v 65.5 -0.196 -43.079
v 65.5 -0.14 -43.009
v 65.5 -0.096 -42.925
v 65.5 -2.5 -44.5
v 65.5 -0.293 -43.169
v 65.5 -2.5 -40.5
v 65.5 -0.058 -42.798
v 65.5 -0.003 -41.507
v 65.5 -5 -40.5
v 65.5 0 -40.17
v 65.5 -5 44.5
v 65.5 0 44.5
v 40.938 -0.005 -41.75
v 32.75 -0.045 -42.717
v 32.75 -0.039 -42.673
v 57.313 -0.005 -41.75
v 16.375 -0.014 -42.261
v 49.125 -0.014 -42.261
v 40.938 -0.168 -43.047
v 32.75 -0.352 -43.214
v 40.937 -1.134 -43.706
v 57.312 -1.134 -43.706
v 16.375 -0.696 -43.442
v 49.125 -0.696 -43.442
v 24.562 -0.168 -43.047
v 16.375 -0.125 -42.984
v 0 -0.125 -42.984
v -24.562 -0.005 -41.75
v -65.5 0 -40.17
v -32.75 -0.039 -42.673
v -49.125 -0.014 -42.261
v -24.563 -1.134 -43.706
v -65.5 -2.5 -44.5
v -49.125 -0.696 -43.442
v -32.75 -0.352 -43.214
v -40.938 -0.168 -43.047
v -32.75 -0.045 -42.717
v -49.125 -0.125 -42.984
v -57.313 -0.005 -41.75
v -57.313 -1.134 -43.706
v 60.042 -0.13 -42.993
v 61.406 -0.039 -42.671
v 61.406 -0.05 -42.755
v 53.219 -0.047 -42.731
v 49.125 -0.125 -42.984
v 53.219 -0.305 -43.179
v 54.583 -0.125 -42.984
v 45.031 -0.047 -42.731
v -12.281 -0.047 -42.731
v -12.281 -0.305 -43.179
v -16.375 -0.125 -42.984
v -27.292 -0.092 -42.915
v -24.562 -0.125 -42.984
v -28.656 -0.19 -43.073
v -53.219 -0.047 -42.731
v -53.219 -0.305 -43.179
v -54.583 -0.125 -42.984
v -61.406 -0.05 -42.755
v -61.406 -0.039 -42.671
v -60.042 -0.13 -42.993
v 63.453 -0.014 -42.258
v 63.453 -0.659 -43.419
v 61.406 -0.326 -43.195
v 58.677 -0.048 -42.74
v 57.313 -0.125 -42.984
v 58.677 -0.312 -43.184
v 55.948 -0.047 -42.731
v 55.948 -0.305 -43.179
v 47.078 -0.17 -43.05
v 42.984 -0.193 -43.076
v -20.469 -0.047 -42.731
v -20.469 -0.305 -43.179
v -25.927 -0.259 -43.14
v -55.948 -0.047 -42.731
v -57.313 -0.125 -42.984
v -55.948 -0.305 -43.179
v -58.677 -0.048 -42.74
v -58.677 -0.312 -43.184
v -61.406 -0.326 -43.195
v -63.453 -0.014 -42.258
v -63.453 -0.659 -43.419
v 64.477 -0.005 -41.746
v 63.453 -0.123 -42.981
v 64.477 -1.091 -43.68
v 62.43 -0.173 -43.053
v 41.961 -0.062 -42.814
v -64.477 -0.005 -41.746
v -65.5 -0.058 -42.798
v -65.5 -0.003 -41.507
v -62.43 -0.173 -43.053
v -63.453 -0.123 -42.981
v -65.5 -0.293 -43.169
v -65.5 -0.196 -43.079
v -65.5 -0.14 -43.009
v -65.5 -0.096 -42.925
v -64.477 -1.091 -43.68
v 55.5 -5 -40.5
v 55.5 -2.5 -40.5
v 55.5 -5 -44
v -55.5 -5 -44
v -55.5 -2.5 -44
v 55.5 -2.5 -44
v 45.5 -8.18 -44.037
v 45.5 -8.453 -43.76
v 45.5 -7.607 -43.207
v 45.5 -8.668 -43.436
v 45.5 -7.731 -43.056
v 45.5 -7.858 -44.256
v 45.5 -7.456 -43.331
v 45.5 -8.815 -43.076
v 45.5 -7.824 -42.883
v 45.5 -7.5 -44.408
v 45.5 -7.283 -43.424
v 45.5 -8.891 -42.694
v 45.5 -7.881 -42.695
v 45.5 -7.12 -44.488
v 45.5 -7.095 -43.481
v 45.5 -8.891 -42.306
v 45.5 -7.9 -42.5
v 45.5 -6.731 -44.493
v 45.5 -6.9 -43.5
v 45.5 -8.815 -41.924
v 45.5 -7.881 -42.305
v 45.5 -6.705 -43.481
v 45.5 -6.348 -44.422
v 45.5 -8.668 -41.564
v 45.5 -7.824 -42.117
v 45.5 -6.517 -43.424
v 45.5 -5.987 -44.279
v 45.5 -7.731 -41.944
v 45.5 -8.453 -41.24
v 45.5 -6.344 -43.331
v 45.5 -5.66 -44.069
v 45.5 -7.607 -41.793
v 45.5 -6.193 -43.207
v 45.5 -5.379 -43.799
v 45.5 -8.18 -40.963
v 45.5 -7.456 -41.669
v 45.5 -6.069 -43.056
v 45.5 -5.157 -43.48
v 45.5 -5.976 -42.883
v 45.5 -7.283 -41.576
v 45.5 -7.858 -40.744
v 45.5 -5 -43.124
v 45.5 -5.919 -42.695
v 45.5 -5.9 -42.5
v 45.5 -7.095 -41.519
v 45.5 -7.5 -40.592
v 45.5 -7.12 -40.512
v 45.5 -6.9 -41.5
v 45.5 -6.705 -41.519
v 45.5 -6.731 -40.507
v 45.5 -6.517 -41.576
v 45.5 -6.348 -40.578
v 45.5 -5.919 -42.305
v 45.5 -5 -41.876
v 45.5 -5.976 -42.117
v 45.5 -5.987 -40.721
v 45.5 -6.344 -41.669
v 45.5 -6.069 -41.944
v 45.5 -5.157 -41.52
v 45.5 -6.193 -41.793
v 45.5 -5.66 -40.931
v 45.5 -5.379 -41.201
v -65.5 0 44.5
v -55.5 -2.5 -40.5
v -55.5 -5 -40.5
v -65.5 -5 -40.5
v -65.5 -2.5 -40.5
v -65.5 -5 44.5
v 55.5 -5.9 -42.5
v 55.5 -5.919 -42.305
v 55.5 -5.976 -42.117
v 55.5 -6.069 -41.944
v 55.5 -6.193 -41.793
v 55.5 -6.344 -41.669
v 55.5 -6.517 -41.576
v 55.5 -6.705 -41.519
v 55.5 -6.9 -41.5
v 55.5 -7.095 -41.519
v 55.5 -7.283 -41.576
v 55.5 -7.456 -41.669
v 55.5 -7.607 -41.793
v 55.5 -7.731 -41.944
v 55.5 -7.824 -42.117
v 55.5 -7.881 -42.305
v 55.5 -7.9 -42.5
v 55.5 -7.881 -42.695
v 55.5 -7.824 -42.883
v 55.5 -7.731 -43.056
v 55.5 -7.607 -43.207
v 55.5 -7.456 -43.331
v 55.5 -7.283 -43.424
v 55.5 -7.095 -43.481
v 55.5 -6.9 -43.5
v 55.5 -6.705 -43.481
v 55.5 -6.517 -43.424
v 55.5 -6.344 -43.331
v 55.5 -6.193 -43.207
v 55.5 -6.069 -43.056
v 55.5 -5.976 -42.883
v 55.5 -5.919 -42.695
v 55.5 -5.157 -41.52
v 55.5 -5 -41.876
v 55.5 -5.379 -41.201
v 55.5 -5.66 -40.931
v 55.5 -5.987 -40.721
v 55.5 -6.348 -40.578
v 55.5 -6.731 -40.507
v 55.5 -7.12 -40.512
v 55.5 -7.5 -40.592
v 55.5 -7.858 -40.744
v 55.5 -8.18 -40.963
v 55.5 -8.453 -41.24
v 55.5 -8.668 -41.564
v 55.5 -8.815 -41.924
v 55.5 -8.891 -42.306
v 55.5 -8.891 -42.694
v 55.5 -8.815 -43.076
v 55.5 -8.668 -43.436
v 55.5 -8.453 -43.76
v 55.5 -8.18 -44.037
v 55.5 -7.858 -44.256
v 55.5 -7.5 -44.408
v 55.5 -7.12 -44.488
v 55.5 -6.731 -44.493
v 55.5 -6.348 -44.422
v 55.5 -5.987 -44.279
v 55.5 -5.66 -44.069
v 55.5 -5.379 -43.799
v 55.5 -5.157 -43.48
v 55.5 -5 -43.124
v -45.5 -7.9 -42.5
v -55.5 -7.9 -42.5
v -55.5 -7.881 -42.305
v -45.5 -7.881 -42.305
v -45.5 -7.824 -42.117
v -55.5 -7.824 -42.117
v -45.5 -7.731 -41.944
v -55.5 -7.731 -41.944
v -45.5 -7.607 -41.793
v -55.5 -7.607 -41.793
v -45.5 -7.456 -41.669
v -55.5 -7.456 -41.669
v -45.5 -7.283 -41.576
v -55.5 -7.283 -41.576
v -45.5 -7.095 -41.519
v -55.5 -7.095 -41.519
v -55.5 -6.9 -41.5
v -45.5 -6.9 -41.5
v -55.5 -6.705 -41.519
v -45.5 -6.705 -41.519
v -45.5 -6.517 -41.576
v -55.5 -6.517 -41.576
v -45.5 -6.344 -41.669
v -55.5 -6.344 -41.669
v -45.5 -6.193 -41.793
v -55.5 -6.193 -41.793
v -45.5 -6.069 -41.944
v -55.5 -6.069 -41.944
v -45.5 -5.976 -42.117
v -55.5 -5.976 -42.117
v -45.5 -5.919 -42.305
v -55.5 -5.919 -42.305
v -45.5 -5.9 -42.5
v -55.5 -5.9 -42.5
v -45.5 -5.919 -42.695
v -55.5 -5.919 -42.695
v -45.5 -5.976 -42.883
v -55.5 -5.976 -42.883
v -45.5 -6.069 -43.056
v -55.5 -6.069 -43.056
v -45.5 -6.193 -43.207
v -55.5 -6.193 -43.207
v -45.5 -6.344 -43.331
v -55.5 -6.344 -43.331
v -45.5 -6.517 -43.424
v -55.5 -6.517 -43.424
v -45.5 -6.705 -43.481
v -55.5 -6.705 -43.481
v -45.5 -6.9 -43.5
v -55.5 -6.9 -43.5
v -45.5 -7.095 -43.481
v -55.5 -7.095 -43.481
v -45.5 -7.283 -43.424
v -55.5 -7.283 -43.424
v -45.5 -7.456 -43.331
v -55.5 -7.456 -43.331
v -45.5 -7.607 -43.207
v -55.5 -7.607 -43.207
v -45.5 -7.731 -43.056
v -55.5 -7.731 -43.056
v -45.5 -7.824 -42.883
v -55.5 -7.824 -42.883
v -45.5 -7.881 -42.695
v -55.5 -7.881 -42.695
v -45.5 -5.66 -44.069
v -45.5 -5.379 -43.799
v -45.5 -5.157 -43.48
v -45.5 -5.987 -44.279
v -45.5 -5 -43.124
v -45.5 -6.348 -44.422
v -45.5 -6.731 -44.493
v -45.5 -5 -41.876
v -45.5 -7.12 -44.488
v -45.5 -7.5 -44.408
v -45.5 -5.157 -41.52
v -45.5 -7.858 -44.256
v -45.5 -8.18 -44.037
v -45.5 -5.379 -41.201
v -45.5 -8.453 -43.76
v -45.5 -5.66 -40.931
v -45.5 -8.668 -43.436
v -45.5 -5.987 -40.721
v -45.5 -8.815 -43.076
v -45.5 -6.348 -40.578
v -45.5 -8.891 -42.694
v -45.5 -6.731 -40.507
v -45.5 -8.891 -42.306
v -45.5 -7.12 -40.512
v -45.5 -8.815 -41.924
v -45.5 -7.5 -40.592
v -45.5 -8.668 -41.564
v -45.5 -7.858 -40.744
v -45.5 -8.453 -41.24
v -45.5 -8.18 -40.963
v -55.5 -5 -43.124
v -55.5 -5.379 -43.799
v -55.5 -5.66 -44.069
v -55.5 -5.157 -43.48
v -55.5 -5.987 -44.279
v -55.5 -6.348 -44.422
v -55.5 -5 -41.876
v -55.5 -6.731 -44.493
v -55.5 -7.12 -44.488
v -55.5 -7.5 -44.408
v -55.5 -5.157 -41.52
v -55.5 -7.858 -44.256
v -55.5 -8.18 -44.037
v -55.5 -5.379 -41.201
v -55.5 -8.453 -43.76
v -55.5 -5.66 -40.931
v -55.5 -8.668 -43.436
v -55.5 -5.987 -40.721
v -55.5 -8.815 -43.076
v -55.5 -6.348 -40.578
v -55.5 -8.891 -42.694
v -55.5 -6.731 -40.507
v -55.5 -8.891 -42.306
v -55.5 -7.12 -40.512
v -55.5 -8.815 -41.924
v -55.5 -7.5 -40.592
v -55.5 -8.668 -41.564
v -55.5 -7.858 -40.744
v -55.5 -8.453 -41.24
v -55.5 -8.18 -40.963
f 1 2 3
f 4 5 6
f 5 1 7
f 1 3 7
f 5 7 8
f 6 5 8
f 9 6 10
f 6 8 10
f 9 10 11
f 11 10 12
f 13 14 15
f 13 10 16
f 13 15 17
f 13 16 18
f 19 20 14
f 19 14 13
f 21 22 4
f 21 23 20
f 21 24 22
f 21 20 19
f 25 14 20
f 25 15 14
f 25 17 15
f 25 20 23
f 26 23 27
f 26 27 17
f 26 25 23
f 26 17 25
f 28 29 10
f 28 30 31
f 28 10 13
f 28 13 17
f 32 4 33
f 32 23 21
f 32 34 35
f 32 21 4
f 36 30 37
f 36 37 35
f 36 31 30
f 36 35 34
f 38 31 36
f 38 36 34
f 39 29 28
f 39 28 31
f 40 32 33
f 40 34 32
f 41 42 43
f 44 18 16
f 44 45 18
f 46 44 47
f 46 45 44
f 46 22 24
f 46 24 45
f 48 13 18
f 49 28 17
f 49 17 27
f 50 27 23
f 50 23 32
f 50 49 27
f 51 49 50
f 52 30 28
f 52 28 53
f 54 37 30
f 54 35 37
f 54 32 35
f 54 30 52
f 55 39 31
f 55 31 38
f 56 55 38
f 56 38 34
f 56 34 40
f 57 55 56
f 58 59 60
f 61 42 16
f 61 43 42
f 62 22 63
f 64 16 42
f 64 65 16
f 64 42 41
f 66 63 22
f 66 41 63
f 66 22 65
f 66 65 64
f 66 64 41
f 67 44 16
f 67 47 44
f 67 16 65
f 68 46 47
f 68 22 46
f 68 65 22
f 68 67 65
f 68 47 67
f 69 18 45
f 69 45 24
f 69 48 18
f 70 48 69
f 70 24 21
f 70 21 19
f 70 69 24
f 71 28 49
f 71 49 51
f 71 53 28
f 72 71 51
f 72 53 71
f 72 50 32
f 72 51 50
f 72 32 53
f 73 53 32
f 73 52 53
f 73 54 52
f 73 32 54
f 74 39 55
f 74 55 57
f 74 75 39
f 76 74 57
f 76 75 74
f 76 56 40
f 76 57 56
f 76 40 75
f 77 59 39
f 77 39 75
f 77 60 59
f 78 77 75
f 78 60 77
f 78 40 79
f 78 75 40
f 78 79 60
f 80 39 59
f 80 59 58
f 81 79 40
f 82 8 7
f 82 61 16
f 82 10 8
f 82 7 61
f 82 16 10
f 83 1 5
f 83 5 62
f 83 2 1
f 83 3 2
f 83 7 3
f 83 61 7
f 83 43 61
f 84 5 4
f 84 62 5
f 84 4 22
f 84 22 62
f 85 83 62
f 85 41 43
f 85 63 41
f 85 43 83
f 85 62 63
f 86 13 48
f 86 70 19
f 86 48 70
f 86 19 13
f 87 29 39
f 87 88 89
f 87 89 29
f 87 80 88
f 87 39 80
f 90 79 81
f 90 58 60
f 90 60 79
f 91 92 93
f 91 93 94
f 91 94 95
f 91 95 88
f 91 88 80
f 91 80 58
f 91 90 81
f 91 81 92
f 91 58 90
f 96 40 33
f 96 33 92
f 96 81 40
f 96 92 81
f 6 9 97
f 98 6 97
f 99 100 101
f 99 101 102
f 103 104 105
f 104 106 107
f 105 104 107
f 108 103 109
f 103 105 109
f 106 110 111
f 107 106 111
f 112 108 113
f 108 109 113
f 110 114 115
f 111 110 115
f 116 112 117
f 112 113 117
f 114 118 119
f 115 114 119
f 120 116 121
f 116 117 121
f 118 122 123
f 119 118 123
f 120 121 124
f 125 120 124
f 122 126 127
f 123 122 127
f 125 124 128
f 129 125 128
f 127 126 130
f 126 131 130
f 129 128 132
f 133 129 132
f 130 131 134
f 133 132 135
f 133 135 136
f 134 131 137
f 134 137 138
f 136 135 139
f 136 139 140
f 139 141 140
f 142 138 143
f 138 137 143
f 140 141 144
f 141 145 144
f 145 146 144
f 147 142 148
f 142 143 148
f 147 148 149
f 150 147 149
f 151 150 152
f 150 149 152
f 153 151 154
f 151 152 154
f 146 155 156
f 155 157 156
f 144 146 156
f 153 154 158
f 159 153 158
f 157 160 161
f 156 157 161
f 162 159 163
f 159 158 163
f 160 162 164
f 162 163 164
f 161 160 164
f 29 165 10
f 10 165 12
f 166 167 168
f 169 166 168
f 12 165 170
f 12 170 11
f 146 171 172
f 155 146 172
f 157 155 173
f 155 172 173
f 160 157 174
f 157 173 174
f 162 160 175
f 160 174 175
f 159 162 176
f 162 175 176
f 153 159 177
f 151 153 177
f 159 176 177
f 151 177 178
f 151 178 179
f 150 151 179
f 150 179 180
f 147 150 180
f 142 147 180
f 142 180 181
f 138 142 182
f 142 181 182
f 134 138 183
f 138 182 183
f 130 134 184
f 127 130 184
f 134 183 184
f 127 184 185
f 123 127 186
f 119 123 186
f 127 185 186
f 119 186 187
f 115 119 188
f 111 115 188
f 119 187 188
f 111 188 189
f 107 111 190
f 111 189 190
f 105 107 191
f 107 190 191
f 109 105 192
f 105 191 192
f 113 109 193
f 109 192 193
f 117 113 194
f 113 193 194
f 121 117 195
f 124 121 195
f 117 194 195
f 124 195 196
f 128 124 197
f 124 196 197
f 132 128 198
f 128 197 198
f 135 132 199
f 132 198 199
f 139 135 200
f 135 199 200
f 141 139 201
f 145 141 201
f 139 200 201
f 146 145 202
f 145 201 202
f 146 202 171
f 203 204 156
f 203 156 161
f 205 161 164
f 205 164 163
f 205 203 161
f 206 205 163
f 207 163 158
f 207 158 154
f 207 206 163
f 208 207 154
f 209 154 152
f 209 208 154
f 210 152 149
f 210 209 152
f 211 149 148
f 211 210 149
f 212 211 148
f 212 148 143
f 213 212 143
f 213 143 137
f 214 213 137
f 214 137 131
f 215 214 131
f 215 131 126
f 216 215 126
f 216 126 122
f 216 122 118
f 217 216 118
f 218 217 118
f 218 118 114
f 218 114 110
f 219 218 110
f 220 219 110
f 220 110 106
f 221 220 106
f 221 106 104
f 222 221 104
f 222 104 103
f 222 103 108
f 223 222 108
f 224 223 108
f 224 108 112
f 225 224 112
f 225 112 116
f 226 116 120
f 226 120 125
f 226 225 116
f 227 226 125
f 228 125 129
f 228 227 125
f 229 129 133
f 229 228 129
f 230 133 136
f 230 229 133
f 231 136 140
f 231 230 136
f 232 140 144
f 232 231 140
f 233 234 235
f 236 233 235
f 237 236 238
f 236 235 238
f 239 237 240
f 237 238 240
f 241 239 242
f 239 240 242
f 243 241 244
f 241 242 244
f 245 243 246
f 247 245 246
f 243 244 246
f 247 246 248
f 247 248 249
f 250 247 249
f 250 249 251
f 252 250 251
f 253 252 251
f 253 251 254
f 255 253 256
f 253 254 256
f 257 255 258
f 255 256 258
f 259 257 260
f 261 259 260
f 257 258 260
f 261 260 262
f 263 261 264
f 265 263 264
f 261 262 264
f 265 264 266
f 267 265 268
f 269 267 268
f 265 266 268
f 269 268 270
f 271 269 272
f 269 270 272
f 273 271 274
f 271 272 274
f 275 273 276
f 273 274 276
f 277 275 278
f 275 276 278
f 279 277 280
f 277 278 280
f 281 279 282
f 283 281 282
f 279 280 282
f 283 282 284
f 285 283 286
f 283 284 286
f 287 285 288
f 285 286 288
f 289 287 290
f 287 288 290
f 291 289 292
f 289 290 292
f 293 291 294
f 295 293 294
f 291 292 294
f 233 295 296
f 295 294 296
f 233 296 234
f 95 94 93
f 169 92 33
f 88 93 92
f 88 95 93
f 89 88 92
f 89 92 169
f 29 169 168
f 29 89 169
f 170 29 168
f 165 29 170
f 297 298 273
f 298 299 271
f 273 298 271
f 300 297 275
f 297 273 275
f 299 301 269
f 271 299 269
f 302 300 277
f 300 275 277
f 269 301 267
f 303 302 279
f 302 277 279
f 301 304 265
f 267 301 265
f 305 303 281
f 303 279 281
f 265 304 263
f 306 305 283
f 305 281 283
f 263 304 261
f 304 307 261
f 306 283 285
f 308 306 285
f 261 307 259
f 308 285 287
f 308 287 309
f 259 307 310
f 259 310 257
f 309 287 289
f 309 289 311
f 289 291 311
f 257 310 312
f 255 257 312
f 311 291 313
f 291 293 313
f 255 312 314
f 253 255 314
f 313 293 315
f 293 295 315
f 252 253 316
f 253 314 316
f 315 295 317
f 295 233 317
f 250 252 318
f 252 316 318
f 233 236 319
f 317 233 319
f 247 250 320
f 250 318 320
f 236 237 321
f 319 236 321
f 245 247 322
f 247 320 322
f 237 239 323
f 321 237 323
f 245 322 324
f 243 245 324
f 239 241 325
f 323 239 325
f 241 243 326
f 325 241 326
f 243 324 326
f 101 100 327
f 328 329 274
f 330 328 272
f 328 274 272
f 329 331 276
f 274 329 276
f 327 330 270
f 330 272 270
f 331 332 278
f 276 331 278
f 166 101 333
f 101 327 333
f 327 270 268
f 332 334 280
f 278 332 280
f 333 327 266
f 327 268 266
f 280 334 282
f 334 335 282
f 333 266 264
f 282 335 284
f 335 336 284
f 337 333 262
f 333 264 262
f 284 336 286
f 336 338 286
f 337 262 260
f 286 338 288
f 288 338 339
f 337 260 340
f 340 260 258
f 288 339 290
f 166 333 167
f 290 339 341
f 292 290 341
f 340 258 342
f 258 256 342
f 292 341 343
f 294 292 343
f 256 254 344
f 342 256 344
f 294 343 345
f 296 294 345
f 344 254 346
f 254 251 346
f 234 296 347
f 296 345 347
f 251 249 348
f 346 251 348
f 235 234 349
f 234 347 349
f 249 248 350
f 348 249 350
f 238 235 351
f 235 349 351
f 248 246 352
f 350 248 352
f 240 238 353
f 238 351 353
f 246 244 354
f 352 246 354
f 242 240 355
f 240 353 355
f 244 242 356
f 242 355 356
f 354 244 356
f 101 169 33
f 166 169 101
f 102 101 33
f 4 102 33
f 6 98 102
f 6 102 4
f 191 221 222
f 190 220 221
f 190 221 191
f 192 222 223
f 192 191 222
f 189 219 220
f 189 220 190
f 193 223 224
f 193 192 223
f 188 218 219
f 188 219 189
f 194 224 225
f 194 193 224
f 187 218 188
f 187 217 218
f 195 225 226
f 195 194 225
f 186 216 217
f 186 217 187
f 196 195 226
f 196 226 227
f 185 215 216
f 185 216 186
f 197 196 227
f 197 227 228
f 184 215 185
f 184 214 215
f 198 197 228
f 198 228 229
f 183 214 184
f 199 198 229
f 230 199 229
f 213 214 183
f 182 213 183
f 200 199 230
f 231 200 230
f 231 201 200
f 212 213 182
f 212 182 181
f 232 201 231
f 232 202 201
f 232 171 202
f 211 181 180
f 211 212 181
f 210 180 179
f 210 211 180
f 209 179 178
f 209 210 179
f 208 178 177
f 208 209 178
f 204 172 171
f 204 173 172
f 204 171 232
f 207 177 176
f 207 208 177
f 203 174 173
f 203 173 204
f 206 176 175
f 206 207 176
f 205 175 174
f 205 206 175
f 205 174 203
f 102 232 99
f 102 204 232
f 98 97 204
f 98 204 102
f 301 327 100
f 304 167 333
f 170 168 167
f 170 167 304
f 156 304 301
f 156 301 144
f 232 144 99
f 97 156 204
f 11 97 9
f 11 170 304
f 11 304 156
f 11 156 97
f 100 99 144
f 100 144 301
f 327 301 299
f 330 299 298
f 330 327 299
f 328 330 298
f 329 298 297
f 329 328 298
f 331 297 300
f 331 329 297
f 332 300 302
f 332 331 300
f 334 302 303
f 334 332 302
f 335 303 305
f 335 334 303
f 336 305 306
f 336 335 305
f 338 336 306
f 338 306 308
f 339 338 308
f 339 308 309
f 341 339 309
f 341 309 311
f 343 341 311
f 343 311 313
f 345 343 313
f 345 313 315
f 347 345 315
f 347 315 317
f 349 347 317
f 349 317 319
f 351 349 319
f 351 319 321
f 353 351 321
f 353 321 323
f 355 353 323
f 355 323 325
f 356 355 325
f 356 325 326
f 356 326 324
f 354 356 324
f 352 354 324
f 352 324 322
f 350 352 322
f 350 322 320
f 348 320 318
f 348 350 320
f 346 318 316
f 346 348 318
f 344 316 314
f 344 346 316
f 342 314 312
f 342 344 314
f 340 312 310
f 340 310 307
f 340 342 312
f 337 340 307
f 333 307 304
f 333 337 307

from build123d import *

# Parameters (mm, degrees)
F0_W        = 131
F0_H        = 89
F1_DEPTH    = 5
F3_START    = -10
F2_R        = 2
F2_R_2      = 1
F3_DEPTH    = 10
F5_START    = -10
F4_R        = 2
F4_R_2      = 1
F5_DEPTH    = 10
F6_W        = 111
F6_H        = 0.5
F7_DEPTH    = 2.5
F8_T1_DEPTH = 152.6506350946


# Not quite as in the source:
# - a fillet or chamfer that OpenCascade refuses, or shapes differently, is made with other operations: its cross-section is extruded or revolved along the edge and cut away or added


with BuildPart() as f1:
    # F0 (on Front) → F1 (new body)
    with BuildSketch(Plane.XZ):
        Rectangle(F0_W, F0_H)
    extrude(amount=F1_DEPTH)

    # F2 (on face) → F3 (join)
    with BuildSketch(Plane(origin=(-65.5, 0, 0), x_dir=(0, -1, 0), z_dir=(-1, 0, 0)).offset(F3_START)):
        with Locations((6.9, -42.5)):
            Circle(F2_R)
        with Locations((6.9, -42.5)):
            Circle(F2_R_2, mode=Mode.SUBTRACT)
    extrude(amount=-F3_DEPTH)

    # F4 (on face) → F5 (join)
    with BuildSketch(Plane.YZ.offset(65.5).offset(F5_START)):
        with Locations((-6.9, -42.5)):
            Circle(F4_R)
        with Locations((-6.9, -42.5)):
            Circle(F4_R_2, mode=Mode.SUBTRACT)
    extrude(amount=-F5_DEPTH)

    # F6 (on face) → F7 (cut)
    with BuildSketch(Plane.XZ.offset(5)):
        Polygon((55.5, -44.5), (65.5, -44.5), (65.5, -40.5), (55.5, -40.5), (55.5, -44), align=None)
        with Locations((0, -44.25)):
            Rectangle(F6_W, F6_H)
        Polygon((-65.5, -44.5), (-55.5, -44.5), (-55.5, -44), (-55.5, -40.5), (-65.5, -40.5), align=None)
    extrude(amount=-F7_DEPTH, mode=Mode.SUBTRACT)

    # F8: fillet of radius 5 on 1 edges, made by hand

    # F8_s2 → F8_t1 (cut)
    with BuildSketch(Plane.YZ.offset(-76.3253175473)):
        with BuildLine():
            add(Edge.make_bspline(
                [(0, -40.1698729811), (0, -43.056624327), (-2.5, -44.5)],
                knots=[0, 0, 0, 1, 1, 1], degree=2, weights=[1, 9, 1]))
            Line((-2.5, -44.5), (0, -44.5))
            Line((0, -44.5), (0, -40.1698729811))
        make_face()
    extrude(amount=F8_T1_DEPTH, mode=Mode.SUBTRACT)


solid = f1.part
